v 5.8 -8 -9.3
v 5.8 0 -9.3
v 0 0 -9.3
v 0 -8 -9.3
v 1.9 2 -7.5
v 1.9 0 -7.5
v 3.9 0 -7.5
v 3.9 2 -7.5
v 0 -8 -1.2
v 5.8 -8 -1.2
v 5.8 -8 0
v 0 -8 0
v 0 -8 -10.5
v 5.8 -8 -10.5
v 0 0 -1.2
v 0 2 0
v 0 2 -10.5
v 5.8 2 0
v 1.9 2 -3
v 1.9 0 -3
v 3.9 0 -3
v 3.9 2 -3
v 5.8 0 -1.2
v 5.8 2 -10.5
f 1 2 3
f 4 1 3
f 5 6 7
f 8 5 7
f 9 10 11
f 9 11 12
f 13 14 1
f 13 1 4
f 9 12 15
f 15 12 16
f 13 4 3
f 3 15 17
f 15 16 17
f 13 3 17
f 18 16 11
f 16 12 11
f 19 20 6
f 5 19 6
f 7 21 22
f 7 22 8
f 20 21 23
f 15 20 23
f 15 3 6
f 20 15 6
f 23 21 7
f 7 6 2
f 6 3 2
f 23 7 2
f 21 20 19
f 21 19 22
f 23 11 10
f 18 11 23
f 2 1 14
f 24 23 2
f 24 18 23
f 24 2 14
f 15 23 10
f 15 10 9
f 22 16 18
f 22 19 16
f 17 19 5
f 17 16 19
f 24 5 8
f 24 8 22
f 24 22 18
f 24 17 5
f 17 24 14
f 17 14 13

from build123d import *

# Parameters (mm, degrees)
CROQUIS1_W              = 5.8
CROQUIS1_H              = 10.5
CROQUIS1_W_2            = 2
CROQUIS1_H_2            = 4.5
SALIENTE_EXTRUIR1_DEPTH = 2
CROQUIS2_W              = 5.8
CROQUIS2_H              = 1.2
SALIENTE_EXTRUIR2_DEPTH = 8


with BuildPart() as part:
    # Croquis1 → Saliente-Extruir1 (new body)
    with BuildSketch(Plane(origin=(0, 0, 0), x_dir=(1, 0, 0), z_dir=(0, 1, 0))):
        with Locations((2.9, 5.25)):
            Rectangle(CROQUIS1_W, CROQUIS1_H)
        with Locations((2.9, 5.25)):
            Rectangle(CROQUIS1_W_2, CROQUIS1_H_2, mode=Mode.SUBTRACT)
    extrude(amount=SALIENTE_EXTRUIR1_DEPTH)

    # Croquis2 → Saliente-Extruir2 (add)
    with BuildSketch(Plane(origin=(0, 0, 0), x_dir=(-1, 0, 0), z_dir=(0, -1, 0))):
        with Locations((-2.9, 9.9)):
            Rectangle(CROQUIS2_W, CROQUIS2_H)
        with Locations((-2.9, 0.6)):
            Rectangle(CROQUIS2_W, CROQUIS2_H)
    extrude(amount=SALIENTE_EXTRUIR2_DEPTH)


solid = part.part
